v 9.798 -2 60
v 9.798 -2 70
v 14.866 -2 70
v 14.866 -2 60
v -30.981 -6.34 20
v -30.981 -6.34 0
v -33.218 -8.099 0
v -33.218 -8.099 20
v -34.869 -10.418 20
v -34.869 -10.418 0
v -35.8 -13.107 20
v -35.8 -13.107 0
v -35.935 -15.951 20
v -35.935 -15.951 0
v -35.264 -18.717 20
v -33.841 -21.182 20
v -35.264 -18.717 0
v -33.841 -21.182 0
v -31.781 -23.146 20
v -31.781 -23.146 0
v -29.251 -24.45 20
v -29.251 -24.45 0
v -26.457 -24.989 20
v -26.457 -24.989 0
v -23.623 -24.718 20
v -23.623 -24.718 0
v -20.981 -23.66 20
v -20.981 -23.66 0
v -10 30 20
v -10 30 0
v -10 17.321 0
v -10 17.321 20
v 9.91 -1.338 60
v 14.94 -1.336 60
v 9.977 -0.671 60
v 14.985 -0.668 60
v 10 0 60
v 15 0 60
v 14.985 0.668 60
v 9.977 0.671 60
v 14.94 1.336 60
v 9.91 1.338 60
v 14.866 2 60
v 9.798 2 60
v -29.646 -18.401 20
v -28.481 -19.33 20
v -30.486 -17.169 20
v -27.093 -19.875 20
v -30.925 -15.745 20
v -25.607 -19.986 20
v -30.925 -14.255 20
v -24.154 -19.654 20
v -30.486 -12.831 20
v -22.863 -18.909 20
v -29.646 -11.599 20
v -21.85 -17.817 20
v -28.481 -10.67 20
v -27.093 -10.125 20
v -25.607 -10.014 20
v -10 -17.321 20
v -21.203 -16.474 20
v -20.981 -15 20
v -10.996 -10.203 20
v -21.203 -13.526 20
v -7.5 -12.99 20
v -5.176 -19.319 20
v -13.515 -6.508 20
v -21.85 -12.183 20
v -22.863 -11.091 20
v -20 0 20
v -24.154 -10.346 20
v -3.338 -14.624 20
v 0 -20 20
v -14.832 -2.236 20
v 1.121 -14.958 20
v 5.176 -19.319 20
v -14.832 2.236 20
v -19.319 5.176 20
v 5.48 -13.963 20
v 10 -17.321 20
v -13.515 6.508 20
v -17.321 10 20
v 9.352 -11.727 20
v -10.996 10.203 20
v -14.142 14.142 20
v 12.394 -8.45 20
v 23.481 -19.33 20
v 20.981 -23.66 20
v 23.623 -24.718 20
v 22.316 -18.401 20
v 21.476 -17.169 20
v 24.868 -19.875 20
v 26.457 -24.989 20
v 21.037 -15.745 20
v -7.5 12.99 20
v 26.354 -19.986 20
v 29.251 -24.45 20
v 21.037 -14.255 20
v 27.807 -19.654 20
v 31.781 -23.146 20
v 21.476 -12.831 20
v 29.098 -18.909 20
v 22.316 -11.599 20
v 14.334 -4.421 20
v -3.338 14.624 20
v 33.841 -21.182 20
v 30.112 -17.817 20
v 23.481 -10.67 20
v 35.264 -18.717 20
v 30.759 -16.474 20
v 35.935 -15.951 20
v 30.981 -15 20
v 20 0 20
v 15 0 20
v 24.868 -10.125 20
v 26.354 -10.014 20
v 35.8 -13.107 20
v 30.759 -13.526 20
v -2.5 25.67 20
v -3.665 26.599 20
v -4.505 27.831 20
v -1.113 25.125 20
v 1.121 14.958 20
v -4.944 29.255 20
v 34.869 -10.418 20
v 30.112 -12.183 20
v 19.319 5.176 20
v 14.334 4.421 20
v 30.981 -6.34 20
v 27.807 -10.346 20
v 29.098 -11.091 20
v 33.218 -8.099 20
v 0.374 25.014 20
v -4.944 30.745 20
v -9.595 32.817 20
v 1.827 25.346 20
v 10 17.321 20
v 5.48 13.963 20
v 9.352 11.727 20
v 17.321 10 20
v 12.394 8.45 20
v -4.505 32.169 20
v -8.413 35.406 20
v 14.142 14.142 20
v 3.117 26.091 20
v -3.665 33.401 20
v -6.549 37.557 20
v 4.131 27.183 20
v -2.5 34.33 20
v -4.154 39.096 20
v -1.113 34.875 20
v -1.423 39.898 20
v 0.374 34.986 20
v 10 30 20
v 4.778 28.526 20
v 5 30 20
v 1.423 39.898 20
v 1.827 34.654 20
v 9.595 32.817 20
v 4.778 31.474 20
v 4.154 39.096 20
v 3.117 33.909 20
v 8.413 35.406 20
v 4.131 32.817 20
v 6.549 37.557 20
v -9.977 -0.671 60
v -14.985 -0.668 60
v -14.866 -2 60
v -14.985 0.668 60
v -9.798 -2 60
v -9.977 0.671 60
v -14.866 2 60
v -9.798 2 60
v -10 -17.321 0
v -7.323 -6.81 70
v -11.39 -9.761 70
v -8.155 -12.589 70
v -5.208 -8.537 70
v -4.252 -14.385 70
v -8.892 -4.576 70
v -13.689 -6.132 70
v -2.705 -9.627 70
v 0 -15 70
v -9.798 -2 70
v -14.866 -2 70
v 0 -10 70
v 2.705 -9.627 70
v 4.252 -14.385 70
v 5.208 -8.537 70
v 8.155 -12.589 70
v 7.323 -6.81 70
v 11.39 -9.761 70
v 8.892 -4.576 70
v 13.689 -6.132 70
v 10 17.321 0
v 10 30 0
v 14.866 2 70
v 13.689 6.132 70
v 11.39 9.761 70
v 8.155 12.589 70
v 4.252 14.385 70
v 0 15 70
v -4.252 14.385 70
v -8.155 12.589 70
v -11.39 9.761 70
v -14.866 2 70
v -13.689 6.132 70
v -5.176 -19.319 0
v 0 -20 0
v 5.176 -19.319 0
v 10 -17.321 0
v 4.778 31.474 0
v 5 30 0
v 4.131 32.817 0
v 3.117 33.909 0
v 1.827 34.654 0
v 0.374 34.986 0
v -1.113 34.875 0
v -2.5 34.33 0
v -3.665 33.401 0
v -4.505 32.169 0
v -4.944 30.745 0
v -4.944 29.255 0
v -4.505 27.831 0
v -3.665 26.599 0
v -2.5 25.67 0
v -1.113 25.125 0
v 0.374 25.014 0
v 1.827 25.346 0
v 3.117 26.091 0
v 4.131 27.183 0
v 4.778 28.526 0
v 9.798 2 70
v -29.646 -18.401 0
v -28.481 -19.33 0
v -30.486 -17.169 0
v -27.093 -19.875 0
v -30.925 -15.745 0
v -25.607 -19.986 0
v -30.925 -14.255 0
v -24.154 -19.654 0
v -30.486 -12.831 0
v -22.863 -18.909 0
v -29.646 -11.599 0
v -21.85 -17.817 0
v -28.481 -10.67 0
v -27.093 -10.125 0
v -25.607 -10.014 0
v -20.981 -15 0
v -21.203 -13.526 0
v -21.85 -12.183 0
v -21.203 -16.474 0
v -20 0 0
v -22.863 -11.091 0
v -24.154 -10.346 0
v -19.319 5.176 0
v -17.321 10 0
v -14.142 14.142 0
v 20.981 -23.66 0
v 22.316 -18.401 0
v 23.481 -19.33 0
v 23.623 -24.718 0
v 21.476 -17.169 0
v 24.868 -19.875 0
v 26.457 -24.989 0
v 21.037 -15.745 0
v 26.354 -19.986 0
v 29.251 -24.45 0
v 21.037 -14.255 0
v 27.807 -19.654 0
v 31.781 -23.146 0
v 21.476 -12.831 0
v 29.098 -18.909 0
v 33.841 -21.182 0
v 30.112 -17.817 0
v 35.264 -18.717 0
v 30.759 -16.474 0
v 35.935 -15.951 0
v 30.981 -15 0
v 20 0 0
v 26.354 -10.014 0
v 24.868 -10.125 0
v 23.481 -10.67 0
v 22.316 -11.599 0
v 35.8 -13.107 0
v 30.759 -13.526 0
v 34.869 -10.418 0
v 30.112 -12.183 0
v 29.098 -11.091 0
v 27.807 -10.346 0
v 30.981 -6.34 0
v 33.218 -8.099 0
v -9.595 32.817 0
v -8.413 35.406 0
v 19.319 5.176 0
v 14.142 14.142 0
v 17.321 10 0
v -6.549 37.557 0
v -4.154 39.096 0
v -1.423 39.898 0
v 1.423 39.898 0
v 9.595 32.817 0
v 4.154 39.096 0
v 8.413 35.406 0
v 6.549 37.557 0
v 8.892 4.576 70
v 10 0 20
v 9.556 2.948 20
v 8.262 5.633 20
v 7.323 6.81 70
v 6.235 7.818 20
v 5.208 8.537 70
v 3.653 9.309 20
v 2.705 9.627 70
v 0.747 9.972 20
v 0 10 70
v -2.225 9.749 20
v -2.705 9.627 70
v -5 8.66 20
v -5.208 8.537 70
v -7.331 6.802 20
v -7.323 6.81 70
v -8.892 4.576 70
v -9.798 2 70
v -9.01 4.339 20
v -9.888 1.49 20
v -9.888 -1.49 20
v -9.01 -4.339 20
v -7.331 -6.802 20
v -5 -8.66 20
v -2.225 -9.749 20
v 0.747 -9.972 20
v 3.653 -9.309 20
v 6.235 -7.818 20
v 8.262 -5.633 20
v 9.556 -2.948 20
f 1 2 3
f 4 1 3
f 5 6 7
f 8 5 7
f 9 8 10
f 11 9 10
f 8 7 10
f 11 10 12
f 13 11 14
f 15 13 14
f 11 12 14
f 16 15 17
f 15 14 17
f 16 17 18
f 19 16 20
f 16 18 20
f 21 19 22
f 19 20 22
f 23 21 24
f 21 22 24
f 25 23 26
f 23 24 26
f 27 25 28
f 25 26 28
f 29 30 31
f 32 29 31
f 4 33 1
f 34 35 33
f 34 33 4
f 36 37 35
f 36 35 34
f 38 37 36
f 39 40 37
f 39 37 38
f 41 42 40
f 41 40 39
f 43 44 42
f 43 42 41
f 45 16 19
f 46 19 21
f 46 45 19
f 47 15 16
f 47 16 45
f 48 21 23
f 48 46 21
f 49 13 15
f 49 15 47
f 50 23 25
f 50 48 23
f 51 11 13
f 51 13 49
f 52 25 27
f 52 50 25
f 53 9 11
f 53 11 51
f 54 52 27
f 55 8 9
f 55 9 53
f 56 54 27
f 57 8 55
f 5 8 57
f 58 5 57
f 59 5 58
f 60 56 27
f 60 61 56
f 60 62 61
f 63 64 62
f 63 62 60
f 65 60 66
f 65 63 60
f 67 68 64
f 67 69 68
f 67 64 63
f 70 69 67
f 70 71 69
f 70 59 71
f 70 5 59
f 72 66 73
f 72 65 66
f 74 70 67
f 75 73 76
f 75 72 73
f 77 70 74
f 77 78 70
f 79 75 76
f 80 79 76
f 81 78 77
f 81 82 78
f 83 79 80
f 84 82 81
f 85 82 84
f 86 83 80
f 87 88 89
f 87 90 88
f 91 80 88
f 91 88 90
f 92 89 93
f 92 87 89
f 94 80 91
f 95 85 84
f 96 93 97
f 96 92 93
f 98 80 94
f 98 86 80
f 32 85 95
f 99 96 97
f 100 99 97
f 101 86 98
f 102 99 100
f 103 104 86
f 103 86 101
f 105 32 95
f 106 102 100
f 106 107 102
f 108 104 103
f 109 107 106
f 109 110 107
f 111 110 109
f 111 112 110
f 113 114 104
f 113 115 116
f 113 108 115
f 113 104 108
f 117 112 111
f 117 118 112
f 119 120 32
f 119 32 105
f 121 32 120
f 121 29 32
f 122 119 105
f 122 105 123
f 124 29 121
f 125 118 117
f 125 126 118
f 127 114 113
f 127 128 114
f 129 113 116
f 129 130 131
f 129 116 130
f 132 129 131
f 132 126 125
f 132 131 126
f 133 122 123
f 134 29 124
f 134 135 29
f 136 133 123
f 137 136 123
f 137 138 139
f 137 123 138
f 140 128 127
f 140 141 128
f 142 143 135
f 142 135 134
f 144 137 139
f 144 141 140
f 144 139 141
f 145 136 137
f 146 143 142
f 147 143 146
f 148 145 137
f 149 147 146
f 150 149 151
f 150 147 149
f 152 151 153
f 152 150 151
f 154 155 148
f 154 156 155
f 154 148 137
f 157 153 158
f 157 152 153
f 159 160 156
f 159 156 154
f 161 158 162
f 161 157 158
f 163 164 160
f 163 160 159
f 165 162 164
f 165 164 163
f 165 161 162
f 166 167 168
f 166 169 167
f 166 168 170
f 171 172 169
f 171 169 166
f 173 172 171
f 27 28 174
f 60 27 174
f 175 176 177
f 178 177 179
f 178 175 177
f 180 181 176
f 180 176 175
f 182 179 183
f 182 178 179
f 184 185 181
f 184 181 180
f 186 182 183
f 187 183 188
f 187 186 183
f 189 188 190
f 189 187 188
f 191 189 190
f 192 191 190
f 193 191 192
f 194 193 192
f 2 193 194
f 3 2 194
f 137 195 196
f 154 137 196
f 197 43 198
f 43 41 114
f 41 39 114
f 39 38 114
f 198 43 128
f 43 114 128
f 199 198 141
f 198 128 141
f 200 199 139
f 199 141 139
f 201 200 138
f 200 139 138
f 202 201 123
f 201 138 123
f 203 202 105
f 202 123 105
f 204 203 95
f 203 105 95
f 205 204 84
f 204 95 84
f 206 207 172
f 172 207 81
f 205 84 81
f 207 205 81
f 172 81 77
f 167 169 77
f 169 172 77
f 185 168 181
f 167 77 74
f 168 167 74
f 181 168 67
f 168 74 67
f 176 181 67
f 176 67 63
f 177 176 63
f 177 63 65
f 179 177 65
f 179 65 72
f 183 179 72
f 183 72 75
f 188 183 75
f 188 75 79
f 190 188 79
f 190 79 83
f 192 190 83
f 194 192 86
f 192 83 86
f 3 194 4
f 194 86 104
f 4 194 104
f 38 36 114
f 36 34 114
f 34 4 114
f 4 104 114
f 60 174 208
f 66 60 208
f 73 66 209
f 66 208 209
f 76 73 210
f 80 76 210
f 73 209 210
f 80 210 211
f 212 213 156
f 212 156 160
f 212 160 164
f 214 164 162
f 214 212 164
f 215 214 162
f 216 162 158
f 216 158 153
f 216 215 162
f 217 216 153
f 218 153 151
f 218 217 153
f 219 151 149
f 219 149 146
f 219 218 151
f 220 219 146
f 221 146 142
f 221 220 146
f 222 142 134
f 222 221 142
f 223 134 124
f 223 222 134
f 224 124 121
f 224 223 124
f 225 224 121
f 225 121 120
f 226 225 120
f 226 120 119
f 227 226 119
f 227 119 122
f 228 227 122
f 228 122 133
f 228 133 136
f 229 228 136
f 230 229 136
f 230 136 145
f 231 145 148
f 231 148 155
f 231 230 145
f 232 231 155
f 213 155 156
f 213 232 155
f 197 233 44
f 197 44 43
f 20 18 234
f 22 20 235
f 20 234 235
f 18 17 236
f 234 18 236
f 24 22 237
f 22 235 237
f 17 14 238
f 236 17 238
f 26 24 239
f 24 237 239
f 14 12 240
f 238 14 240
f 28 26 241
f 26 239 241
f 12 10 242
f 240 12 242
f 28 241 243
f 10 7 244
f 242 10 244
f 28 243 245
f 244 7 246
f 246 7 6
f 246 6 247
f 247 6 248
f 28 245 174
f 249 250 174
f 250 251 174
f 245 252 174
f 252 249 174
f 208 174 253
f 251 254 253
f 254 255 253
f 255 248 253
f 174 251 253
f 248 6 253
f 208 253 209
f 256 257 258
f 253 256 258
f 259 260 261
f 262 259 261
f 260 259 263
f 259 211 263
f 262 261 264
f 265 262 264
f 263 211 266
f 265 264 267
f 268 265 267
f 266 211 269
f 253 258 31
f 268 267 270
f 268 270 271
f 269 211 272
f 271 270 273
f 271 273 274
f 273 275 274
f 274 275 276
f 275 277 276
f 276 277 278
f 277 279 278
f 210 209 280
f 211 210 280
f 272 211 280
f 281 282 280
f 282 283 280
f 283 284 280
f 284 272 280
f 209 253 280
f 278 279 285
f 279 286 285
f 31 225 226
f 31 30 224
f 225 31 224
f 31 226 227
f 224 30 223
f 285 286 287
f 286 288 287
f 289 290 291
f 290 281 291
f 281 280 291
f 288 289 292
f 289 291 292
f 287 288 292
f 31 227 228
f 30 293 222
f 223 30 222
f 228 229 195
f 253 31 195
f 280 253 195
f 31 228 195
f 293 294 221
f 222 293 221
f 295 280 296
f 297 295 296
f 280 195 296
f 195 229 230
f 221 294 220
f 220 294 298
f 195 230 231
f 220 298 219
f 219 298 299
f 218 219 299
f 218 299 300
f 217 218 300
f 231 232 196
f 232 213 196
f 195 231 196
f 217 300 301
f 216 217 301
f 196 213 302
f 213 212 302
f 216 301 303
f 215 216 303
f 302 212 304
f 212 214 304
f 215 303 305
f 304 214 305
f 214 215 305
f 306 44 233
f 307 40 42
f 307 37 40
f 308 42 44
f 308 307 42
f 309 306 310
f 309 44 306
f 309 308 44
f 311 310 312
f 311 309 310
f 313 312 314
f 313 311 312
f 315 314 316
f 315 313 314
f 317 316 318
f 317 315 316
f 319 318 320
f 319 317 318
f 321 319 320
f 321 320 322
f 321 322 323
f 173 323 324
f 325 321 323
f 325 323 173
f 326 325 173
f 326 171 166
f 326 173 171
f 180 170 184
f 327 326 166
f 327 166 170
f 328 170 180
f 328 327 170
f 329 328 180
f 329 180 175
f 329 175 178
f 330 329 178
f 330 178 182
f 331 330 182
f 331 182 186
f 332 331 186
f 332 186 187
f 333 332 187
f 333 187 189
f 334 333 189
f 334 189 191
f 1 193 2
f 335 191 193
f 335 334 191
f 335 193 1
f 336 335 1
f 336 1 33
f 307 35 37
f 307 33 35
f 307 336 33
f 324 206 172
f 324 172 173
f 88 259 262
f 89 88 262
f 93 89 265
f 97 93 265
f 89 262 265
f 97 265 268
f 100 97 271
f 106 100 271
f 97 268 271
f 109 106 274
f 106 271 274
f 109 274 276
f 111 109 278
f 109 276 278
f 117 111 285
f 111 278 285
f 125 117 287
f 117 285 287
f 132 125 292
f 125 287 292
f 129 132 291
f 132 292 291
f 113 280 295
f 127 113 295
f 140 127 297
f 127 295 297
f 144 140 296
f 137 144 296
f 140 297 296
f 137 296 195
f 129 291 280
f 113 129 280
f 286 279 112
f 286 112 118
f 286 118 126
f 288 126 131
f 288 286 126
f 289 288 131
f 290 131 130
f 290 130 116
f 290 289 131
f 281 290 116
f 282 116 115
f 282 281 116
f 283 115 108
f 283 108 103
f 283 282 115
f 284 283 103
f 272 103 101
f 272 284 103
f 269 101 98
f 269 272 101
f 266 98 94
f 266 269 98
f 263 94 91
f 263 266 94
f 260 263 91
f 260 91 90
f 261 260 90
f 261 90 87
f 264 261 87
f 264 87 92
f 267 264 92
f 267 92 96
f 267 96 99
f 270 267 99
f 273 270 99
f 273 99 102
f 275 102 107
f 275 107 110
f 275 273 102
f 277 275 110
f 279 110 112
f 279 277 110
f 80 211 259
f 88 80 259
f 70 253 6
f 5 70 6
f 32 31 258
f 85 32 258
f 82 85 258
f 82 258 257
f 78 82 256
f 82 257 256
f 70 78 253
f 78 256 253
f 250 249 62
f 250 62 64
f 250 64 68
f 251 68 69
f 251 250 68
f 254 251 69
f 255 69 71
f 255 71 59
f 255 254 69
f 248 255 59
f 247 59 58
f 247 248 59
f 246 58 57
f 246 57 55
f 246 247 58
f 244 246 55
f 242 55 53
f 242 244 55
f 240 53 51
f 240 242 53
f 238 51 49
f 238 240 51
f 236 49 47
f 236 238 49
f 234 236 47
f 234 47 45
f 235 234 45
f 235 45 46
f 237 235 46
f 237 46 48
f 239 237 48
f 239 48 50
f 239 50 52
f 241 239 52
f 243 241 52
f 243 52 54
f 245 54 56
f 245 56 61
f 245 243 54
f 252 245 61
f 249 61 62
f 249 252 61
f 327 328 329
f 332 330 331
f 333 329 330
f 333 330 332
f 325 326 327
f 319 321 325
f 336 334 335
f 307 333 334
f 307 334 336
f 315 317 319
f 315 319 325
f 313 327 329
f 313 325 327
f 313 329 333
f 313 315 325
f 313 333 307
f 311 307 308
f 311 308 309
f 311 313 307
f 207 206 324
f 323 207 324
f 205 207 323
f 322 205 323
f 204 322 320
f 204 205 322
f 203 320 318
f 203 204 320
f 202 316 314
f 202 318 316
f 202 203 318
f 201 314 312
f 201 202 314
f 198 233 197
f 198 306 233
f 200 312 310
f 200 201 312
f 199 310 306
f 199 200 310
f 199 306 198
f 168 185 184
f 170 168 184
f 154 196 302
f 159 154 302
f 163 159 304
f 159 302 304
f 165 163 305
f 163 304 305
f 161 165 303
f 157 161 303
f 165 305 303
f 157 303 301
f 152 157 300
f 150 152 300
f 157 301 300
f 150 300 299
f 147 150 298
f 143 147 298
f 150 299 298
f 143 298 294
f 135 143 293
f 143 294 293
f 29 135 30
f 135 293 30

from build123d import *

# Parameters (mm, degrees)
SKETCH_1_R          = 5
EXTRUDE_1_DEPTH     = 20
SKETCH_2_R          = 15
SKETCH_2_R_2        = 10
EXTRUDE_2_DEPTH     = 50
SKETCH_3_W          = 53.583106362
SKETCH_3_H          = 4
CUT_EXTRUDE_1_DEPTH = 10


with BuildPart() as part:
    # 草圖1 → 填料-伸長1 (new body)
    with BuildSketch(Plane.XY):
        with BuildLine():
            ThreePointArc((-30.980762114, -6.339745962), (-34.641016151, -20), (-20.980762114, -23.660254038))
            Line((-20.980762114, -23.660254038), (-10, -17.320508076))
            ThreePointArc((-10, -17.320508076), (0, -20), (10, -17.320508076))
            Line((10, -17.320508076), (20.980762114, -23.660254038))
            ThreePointArc((20.980762114, -23.660254038), (34.641016151, -20), (30.980762114, -6.339745962))
            Line((30.980762114, -6.339745962), (20, 0))
            ThreePointArc((20, 0), (17.320508076, 10), (10, 17.320508076))
            Line((10, 17.320508076), (10, 30))
            ThreePointArc((10, 30), (0, 40), (-10, 30))
            Line((-10, 30), (-10, 17.320508076))
            ThreePointArc((-10, 17.320508076), (-17.320508076, 10), (-20, 0))
            Line((-20, 0), (-30.980762114, -6.339745962))
        make_face()
        with Locations((-25.980762114, -15)):
            Circle(SKETCH_1_R, mode=Mode.SUBTRACT)
        with Locations((25.980762114, -15)):
            Circle(SKETCH_1_R, mode=Mode.SUBTRACT)
        with Locations((0, 30)):
            Circle(SKETCH_1_R, mode=Mode.SUBTRACT)
    extrude(amount=EXTRUDE_1_DEPTH)

    # 草圖2 → 填料-伸長2 (add)
    with BuildSketch(Plane.XY.offset(20)):
        Circle(SKETCH_2_R)
        Circle(SKETCH_2_R_2, mode=Mode.SUBTRACT)
    extrude(amount=EXTRUDE_2_DEPTH)

    # 草圖3 → 除料-伸長1 (cut)
    with BuildSketch(Plane.XY.offset(70)):
        Rectangle(SKETCH_3_W, SKETCH_3_H)
    extrude(amount=-CUT_EXTRUDE_1_DEPTH, mode=Mode.SUBTRACT)


solid = part.part
